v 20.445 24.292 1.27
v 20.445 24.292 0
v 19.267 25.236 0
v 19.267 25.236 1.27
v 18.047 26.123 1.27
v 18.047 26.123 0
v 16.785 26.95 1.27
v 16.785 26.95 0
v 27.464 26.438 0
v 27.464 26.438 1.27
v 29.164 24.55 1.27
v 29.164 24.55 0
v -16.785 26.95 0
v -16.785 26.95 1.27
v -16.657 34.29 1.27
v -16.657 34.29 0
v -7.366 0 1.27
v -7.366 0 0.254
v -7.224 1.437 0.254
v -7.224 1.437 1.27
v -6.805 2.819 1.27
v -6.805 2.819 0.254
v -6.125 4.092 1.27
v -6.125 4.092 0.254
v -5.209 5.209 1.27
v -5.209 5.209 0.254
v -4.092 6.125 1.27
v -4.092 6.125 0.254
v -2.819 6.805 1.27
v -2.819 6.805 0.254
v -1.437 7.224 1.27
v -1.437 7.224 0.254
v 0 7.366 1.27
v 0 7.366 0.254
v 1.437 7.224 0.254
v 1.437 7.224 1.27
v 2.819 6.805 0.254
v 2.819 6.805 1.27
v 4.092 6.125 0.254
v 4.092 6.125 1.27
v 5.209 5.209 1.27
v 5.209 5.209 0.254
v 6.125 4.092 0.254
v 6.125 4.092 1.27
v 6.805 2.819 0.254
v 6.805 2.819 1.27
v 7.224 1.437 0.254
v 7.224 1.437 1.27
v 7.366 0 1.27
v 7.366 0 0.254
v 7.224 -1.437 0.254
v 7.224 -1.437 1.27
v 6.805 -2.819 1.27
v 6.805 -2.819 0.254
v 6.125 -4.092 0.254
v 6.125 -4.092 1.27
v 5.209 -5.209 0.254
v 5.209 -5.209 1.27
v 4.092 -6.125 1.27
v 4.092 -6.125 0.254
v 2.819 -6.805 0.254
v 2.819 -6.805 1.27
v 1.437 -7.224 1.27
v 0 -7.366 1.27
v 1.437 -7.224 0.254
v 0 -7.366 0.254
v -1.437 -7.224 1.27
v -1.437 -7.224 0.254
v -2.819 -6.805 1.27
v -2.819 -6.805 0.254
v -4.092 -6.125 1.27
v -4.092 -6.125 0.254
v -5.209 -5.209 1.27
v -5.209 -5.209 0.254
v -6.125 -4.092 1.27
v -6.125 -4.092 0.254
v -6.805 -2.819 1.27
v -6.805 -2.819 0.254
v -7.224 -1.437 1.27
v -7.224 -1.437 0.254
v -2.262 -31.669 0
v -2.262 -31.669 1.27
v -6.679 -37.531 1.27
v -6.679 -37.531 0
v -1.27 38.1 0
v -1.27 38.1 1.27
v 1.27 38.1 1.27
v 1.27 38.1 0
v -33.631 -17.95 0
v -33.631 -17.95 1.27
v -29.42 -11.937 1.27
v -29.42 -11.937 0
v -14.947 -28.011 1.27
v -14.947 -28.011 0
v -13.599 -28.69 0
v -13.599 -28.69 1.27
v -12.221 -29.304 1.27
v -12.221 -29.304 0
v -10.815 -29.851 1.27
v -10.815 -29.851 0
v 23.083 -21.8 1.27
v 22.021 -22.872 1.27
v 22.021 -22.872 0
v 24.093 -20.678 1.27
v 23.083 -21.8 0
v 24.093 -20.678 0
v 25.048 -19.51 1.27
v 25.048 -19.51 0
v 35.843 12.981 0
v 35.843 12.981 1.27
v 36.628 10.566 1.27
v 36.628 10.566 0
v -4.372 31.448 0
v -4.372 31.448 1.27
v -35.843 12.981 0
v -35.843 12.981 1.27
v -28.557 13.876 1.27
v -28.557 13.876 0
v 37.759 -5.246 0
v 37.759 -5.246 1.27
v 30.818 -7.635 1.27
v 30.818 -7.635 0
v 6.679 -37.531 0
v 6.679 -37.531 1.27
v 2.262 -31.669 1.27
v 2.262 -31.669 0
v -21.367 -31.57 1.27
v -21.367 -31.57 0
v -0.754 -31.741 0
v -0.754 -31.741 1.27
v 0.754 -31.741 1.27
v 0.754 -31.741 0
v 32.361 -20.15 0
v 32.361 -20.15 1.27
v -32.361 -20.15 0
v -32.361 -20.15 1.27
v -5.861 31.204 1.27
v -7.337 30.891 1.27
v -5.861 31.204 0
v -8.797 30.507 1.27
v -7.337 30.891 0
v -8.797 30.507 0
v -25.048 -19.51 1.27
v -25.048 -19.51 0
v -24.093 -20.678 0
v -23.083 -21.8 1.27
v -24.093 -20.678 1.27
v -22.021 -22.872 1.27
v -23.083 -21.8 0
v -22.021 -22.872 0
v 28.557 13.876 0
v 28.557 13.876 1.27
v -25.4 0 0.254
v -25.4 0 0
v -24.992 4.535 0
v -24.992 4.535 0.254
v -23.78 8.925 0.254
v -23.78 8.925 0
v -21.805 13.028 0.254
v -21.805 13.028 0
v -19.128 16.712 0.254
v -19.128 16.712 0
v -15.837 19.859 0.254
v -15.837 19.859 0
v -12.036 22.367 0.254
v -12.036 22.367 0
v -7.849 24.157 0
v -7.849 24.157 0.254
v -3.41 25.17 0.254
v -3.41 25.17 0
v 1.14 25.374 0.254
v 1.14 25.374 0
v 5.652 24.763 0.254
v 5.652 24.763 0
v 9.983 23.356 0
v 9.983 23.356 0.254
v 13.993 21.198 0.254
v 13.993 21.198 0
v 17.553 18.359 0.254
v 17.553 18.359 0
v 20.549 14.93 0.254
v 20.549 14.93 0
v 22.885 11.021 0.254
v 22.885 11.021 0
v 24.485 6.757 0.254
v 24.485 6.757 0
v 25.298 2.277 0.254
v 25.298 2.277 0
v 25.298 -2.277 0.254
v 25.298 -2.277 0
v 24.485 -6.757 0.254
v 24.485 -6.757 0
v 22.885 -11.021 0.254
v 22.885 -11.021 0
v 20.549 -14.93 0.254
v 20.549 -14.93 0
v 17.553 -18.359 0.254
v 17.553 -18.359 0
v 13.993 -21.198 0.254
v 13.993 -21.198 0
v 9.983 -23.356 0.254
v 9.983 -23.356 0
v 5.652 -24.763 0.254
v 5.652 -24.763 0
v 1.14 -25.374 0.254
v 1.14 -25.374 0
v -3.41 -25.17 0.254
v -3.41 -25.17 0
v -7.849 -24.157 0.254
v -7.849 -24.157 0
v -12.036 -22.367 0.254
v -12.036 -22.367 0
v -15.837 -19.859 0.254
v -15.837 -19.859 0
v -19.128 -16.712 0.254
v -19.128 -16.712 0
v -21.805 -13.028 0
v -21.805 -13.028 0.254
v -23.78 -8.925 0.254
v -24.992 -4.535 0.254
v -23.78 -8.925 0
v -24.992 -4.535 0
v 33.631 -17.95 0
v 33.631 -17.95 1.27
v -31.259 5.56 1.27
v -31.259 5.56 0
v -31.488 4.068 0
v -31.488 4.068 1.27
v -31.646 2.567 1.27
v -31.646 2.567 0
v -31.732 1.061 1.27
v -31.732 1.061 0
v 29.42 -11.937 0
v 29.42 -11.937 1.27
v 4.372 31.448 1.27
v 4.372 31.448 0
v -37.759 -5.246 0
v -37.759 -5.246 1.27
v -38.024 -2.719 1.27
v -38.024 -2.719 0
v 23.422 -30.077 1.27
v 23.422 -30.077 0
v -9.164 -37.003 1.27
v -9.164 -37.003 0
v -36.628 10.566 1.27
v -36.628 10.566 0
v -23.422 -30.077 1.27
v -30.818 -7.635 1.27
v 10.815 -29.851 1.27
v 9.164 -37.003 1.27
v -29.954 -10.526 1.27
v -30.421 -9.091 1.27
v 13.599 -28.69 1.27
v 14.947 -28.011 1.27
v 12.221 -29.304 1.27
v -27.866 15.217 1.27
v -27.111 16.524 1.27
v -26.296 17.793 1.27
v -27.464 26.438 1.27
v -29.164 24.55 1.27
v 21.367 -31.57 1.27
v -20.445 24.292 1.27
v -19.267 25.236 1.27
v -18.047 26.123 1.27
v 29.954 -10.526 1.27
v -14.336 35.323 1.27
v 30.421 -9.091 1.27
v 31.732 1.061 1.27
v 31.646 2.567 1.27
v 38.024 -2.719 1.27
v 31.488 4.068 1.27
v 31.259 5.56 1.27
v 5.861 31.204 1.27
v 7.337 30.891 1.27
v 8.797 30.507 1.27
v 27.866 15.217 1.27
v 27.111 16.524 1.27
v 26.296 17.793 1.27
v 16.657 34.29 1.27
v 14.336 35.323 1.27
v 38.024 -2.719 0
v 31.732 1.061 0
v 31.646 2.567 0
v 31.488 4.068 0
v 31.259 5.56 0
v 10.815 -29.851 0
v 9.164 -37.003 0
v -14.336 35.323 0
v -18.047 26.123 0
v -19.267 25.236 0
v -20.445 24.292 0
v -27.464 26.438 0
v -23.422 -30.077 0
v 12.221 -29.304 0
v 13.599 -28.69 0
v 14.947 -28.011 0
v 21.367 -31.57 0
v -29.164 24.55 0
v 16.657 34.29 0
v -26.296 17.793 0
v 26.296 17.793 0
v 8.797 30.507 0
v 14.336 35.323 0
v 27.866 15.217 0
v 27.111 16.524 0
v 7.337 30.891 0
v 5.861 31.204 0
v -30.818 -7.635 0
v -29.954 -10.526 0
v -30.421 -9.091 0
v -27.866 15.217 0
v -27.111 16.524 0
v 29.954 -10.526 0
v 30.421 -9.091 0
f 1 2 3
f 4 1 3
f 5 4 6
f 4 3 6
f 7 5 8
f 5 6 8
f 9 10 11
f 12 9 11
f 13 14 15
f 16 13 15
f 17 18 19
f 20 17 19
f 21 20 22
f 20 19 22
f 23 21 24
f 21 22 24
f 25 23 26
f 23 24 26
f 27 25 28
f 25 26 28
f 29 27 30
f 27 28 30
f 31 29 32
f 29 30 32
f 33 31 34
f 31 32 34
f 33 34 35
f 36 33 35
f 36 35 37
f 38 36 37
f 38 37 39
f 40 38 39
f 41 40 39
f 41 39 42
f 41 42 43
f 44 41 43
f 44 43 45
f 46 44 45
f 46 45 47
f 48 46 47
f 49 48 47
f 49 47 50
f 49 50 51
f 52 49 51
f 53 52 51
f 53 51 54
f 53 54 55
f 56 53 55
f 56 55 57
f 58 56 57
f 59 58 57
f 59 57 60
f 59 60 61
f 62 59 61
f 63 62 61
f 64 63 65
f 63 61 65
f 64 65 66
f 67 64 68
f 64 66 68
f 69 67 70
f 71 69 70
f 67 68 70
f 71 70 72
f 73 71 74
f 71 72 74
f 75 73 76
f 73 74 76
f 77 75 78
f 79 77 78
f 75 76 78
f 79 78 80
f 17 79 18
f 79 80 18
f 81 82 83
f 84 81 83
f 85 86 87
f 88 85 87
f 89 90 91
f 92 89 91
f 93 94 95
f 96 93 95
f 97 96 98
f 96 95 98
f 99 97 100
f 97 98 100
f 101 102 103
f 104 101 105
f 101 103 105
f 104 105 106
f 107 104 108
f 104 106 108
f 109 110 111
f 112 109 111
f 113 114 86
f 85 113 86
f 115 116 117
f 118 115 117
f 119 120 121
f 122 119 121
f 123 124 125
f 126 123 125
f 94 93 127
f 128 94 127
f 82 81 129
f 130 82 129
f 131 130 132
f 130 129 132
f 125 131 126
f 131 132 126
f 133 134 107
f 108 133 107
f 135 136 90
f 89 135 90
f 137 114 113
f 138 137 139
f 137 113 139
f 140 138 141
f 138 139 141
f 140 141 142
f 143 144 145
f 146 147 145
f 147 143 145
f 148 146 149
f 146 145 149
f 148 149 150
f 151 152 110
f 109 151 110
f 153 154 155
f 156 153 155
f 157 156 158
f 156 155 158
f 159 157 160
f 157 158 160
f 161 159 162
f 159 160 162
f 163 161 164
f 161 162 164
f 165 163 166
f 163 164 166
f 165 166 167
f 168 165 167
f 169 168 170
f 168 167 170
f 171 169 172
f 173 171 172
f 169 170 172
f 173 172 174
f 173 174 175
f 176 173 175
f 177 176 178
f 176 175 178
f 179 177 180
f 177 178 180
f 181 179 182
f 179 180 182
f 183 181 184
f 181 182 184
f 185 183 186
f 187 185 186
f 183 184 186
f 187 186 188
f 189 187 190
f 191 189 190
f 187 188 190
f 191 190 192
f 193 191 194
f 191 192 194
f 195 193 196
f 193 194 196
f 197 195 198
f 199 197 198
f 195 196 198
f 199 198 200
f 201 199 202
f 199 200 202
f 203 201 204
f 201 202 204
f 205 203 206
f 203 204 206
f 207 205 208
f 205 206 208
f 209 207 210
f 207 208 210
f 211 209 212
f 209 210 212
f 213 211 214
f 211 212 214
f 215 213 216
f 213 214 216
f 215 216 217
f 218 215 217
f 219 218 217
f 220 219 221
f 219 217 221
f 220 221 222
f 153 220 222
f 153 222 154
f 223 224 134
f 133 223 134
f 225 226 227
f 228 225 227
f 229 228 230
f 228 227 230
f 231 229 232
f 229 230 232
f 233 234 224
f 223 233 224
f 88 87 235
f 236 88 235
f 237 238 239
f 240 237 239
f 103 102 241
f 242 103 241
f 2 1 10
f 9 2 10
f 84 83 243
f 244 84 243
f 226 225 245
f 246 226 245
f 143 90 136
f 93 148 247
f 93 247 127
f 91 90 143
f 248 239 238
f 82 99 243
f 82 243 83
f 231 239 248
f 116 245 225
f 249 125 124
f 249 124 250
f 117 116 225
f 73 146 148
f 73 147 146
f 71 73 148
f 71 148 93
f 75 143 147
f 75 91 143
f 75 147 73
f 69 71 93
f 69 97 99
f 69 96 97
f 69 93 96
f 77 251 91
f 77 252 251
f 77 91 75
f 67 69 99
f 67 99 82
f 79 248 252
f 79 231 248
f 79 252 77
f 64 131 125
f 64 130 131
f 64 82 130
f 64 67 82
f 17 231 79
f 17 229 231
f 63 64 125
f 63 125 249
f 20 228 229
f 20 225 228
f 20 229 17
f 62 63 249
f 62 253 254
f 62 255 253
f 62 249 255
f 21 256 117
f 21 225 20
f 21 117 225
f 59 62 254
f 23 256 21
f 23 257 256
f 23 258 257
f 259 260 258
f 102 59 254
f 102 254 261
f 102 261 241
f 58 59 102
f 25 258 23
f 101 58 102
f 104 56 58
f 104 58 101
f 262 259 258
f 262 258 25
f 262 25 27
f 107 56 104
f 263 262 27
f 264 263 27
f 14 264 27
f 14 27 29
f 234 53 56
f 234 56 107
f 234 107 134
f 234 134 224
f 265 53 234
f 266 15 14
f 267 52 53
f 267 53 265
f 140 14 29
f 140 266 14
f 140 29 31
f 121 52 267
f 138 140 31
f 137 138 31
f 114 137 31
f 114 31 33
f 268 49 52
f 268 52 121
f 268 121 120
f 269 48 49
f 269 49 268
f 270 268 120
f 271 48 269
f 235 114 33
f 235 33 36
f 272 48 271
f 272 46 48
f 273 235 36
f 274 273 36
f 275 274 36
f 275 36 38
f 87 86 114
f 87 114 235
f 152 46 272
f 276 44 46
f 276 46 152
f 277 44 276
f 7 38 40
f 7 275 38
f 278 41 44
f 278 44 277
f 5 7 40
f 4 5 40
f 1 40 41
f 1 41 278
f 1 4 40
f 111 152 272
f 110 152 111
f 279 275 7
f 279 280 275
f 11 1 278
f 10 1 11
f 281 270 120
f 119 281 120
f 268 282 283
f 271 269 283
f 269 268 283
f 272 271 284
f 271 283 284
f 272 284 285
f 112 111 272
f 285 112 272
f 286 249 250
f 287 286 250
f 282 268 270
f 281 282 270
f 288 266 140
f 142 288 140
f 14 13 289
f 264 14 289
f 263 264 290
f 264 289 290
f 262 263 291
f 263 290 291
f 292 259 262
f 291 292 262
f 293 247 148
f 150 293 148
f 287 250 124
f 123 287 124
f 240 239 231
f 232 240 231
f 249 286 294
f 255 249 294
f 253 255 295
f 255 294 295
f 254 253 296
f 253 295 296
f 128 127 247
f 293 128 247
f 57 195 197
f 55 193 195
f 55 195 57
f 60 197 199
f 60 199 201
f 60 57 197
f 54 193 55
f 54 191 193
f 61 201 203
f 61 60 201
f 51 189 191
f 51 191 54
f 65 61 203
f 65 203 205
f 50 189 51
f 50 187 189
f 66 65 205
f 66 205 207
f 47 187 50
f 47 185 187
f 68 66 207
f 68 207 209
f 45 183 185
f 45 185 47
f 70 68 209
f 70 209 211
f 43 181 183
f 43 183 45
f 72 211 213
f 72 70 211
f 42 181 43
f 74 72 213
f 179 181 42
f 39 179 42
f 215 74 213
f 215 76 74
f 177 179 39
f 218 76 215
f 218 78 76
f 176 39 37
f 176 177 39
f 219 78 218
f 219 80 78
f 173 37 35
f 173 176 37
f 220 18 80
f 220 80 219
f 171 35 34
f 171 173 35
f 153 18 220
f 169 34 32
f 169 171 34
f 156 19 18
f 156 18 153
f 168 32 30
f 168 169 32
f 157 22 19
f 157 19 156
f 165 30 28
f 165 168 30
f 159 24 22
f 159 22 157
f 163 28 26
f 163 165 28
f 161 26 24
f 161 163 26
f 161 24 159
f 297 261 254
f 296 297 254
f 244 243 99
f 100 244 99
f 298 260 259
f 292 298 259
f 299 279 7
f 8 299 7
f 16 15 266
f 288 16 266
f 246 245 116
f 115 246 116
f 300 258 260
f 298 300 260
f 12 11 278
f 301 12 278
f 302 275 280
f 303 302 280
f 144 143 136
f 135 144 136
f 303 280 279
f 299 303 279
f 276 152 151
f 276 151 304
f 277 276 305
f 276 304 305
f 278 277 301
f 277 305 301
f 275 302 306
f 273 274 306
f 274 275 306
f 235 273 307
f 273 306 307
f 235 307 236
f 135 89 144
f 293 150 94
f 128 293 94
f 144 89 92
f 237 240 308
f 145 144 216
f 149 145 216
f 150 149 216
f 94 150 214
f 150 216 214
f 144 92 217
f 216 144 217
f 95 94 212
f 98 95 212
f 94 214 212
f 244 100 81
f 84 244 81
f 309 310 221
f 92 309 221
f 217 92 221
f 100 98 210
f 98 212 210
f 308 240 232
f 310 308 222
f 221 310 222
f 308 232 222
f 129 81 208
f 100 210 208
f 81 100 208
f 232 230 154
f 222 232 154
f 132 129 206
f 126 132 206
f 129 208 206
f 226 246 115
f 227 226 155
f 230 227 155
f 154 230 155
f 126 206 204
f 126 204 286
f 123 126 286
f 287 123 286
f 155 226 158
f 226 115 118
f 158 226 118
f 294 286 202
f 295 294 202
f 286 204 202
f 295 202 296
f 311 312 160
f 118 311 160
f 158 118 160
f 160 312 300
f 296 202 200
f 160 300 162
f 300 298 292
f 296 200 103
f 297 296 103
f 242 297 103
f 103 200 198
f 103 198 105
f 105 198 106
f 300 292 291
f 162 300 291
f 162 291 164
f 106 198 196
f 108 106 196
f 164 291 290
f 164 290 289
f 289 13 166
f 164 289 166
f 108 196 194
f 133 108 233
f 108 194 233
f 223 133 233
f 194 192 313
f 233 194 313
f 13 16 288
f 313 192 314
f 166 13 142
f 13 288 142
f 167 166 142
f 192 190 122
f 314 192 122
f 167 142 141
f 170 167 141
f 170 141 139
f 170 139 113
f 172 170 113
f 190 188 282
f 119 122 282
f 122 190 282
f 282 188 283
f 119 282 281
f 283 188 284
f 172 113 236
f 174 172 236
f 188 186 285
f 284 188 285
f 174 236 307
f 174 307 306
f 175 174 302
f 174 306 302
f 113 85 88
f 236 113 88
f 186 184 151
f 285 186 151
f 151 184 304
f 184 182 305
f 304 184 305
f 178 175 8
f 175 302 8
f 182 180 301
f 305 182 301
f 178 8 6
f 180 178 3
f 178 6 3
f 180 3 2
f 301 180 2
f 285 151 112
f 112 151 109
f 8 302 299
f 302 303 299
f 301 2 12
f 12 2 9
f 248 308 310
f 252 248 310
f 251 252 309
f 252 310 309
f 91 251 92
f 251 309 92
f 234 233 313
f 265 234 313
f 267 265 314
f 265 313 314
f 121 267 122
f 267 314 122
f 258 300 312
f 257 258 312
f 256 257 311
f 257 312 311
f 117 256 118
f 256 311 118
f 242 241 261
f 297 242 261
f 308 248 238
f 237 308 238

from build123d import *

# Parameters (mm, degrees)
SKETCH1_R           = 31.75
BOSS_EXTRUDE1_DEPTH = 1.27
BOSS_EXTRUDE2_DEPTH = 1.27
SKETCH3_R           = 7.366
CUT_EXTRUDE1_DEPTH  = 10
CIRPATTERN1_COUNT   = 15
SKETCH4_R           = 25.4
CUT_EXTRUDE2_DEPTH  = 0.254


with BuildPart() as part:
    # Sketch1 → Boss-Extrude1 (new body)
    with BuildSketch(Plane.XY):
        Circle(SKETCH1_R)
    extrude(amount=BOSS_EXTRUDE1_DEPTH)

    # Sketch2 → Boss-Extrude2 (add)
    with BuildSketch(Plane.XY.offset(1.27)):
        with BuildLine():
            Line((-1.27, 38.1), (1.27, 38.1))
            Line((1.27, 38.1), (4.372096767, 31.447532015))
            ThreePointArc((4.372096767, 31.447532015), (0, 31.75), (-4.372096767, 31.447532015))
            Line((-4.372096767, 31.447532015), (-1.27, 38.1))
        make_face()
    boss_extrude2 = extrude(amount=-BOSS_EXTRUDE2_DEPTH)

    # Sketch3 → Cut-Extrude1 (cut)
    with BuildSketch(Plane(origin=(0, 0, 0), x_dir=(-1, 0, 0), z_dir=(0, 0, -1))):
        Circle(SKETCH3_R)
    extrude(amount=-CUT_EXTRUDE1_DEPTH, mode=Mode.SUBTRACT)

    # CirPattern1: Boss-Extrude2 ×15 about axis
    cirpattern1_axis = Axis((0, 0, 0), (0, 0, 1))
    for i in range(1, CIRPATTERN1_COUNT):
        add(boss_extrude2.rotate(cirpattern1_axis, i * 360 / CIRPATTERN1_COUNT))

    # Sketch4 → Cut-Extrude2 (cut)
    with BuildSketch(Plane(origin=(0, 0, 0), x_dir=(-1, 0, 0), z_dir=(0, 0, -1))):
        Circle(SKETCH4_R)
    extrude(amount=-CUT_EXTRUDE2_DEPTH, mode=Mode.SUBTRACT)


solid = part.part
